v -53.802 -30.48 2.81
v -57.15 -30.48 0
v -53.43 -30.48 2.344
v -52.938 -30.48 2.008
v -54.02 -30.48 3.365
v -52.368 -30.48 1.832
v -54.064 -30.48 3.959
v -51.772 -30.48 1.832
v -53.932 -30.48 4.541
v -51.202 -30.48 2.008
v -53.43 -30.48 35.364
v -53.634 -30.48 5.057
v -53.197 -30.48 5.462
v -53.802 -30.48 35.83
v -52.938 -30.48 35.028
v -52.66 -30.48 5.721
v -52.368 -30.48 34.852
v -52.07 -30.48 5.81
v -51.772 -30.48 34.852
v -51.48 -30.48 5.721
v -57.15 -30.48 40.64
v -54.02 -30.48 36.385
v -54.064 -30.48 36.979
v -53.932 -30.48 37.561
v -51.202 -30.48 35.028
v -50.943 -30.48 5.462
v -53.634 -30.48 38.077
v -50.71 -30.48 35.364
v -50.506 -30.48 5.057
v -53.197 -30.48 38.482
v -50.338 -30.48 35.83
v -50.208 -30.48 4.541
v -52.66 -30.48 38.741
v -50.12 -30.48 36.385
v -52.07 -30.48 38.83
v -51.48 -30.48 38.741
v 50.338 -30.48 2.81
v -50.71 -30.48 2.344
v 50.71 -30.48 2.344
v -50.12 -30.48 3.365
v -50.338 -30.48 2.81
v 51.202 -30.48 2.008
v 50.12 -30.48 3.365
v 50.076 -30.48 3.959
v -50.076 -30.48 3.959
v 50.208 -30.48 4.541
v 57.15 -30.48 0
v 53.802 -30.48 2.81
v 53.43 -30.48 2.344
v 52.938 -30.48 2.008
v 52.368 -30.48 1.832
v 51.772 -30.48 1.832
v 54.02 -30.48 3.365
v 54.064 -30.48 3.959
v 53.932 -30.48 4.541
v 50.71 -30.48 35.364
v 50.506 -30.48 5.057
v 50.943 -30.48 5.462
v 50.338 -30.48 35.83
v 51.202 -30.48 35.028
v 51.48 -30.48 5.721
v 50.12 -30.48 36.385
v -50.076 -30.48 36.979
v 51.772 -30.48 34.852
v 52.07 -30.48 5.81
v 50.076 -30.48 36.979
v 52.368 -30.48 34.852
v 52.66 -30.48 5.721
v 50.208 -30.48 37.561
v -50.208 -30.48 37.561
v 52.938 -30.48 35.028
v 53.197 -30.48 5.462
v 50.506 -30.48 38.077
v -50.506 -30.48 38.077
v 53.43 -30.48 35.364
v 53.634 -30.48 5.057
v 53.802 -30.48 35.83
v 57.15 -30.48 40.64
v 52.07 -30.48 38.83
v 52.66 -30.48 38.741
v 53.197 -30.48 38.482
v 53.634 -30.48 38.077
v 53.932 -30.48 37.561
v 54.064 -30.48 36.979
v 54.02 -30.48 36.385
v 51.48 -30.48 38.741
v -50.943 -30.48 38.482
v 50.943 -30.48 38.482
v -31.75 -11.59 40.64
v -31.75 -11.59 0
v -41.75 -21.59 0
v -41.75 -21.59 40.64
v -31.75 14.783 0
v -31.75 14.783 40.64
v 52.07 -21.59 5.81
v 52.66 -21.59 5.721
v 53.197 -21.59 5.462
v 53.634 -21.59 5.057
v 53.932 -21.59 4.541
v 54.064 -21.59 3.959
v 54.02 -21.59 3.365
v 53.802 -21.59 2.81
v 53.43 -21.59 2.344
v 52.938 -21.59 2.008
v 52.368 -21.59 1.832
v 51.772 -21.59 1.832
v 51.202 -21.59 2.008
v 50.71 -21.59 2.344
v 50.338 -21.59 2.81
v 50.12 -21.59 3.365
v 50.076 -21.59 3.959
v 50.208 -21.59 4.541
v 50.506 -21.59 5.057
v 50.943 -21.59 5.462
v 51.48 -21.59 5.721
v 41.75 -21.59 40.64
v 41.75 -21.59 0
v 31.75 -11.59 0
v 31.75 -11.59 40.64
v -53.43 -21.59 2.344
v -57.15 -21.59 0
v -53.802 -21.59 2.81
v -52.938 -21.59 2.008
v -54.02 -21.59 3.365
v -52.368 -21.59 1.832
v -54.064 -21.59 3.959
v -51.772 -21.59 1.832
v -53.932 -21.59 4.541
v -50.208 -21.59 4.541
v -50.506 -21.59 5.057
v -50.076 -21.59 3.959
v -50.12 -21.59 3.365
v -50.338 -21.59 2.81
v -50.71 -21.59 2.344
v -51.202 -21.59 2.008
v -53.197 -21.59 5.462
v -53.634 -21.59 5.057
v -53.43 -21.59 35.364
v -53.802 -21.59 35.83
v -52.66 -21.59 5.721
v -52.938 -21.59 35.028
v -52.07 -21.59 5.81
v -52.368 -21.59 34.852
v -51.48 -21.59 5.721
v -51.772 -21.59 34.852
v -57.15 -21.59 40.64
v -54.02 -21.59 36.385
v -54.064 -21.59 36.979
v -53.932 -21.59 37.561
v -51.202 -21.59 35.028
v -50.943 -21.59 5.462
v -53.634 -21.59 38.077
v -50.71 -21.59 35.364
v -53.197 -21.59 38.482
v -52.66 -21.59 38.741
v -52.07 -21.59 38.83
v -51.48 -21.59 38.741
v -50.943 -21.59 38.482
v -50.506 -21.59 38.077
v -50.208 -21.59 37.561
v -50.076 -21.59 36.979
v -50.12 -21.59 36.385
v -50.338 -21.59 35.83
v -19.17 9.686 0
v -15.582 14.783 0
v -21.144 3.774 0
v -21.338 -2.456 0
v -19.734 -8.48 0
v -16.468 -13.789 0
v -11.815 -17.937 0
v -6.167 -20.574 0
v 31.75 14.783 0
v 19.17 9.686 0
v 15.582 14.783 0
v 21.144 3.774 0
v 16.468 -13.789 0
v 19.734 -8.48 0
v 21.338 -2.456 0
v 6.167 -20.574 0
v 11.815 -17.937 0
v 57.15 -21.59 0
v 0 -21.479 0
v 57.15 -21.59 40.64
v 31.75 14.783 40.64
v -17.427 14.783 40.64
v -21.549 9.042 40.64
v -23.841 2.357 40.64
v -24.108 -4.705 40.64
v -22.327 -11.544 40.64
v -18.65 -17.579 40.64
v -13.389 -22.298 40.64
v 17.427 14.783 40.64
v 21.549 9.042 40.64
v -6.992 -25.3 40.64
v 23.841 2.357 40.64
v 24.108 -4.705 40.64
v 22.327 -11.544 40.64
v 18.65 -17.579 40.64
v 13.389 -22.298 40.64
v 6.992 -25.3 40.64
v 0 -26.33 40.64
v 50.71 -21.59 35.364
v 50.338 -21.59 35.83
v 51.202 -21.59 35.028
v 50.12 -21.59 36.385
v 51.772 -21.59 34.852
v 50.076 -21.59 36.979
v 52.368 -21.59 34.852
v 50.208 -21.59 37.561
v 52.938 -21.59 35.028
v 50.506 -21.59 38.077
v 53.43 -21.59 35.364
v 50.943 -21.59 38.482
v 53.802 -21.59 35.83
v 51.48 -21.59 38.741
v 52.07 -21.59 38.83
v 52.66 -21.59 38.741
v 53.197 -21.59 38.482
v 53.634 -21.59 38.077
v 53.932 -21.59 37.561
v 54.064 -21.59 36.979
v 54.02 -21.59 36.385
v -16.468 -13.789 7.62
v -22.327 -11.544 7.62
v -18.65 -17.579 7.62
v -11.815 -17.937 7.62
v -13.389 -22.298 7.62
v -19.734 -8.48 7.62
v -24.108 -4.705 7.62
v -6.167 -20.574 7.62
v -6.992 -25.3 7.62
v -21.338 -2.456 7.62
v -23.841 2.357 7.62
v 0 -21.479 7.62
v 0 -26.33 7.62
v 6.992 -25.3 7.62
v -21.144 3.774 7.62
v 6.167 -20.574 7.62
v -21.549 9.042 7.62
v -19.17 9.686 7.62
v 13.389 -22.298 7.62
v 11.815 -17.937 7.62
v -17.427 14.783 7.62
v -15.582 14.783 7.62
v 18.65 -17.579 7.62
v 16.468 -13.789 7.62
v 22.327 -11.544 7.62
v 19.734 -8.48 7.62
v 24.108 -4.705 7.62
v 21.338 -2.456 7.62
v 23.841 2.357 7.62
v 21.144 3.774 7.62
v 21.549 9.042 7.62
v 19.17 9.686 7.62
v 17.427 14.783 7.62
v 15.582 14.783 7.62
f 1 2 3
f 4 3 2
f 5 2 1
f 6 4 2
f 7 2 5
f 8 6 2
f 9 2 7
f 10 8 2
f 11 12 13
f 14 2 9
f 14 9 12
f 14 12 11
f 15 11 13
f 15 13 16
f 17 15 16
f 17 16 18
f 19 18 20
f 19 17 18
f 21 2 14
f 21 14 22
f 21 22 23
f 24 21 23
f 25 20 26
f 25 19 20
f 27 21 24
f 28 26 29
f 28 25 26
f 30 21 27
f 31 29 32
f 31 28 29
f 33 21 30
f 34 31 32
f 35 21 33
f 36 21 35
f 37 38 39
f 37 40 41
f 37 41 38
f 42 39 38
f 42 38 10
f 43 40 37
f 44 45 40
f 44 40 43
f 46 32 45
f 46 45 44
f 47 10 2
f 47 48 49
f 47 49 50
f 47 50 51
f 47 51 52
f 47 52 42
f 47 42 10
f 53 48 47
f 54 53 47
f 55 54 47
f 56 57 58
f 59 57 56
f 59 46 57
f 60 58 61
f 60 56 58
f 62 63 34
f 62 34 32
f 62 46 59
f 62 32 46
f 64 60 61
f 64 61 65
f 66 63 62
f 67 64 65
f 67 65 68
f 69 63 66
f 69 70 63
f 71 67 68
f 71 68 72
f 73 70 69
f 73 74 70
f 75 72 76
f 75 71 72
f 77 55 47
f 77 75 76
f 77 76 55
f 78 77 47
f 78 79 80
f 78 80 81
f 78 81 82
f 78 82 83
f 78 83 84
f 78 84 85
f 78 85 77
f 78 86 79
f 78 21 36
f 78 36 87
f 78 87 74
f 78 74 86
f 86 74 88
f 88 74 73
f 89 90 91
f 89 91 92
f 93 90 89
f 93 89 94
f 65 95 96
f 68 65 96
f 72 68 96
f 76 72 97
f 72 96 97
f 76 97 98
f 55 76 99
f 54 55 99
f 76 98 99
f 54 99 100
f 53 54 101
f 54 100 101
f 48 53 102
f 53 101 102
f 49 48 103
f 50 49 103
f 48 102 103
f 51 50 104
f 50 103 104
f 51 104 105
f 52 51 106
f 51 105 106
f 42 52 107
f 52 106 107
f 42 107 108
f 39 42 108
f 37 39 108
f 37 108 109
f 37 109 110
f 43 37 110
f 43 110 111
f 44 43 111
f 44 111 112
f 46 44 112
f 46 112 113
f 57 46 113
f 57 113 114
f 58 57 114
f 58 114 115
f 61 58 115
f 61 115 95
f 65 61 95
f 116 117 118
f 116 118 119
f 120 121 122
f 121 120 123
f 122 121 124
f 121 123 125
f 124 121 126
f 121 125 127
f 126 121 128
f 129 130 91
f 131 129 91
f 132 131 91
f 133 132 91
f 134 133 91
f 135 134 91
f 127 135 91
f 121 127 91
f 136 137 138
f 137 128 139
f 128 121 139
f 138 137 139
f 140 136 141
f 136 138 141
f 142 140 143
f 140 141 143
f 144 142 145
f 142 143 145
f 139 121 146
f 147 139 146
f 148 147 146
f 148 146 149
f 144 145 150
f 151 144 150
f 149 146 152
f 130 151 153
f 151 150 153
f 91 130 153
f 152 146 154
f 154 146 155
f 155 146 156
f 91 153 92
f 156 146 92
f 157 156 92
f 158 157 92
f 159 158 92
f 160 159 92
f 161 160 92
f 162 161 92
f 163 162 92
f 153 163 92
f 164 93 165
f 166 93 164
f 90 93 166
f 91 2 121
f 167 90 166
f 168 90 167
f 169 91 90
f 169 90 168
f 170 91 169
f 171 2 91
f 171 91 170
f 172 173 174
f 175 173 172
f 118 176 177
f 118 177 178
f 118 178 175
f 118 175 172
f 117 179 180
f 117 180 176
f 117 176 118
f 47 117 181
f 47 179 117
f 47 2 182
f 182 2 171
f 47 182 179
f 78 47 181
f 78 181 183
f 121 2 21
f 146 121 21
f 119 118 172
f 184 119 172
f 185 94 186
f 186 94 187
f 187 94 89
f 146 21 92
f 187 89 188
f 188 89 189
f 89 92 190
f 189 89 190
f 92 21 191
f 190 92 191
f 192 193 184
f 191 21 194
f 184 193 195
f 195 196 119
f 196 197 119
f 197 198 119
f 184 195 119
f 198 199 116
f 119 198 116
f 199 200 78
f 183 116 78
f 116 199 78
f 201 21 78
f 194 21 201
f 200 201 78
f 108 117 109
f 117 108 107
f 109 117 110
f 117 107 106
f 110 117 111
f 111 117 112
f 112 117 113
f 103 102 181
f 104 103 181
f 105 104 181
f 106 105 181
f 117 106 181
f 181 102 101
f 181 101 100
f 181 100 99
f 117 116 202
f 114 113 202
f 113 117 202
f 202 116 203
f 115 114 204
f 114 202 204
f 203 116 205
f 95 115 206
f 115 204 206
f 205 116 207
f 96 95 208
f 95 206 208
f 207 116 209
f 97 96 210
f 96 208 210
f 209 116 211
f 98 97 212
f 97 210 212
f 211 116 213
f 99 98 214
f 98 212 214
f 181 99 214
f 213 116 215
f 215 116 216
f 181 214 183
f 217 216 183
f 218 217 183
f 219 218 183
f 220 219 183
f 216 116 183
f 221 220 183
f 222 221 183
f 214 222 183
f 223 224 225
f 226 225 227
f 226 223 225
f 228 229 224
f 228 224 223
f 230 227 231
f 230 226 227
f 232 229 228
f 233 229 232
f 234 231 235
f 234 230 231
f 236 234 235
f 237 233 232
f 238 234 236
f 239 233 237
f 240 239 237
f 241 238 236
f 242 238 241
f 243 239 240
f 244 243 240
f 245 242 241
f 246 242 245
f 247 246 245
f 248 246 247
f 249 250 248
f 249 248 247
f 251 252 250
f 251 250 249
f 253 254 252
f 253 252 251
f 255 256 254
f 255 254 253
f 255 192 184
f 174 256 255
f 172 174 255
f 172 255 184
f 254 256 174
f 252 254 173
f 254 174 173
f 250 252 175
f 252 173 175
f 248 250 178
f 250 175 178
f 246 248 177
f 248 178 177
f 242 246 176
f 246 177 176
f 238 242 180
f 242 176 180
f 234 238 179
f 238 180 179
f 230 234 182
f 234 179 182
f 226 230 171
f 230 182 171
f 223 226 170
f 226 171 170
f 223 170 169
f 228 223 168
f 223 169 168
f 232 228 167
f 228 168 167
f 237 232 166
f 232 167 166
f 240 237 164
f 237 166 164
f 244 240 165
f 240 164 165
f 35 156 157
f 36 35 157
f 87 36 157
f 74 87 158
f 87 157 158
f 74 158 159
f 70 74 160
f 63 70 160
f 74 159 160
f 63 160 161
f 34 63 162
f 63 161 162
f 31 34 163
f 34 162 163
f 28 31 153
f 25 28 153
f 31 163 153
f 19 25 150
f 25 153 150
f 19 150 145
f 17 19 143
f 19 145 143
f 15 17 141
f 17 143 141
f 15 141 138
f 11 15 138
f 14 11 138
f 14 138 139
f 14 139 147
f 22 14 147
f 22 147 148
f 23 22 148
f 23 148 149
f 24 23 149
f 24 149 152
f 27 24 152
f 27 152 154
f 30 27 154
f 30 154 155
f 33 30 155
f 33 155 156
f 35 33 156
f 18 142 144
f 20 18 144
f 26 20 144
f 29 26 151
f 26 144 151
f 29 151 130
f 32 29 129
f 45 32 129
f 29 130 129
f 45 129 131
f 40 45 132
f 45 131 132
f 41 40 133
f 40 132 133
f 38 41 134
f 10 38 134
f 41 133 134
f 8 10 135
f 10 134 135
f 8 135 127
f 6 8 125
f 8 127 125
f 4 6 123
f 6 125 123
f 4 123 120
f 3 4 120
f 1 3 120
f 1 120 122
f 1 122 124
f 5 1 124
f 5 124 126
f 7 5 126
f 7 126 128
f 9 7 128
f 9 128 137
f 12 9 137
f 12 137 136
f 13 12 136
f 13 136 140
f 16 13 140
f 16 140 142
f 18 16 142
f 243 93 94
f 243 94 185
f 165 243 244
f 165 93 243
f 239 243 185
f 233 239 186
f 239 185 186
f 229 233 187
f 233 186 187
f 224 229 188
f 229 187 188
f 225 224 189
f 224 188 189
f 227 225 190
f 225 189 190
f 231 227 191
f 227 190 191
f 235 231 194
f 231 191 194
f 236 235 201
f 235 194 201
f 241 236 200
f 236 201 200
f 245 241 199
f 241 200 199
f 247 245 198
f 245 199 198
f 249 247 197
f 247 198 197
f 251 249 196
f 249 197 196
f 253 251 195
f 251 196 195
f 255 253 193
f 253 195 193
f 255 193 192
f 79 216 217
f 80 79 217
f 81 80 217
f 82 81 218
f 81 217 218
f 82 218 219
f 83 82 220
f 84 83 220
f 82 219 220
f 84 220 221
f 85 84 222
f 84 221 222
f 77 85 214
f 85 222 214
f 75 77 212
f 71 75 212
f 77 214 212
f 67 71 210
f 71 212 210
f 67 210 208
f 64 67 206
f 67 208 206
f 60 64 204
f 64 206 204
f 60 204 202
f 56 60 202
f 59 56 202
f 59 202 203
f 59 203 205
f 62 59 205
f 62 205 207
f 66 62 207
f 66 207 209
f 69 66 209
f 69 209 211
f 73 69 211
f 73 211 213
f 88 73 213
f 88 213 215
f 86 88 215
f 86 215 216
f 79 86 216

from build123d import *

# Parameters (mm, degrees)
SKETCH1_W           = 63.5
SKETCH1_H           = 60.96
BOSS_EXTRUDE1_DEPTH = 40.64
SKETCH2_R           = 24.25
CUT_EXTRUDE1_DEPTH  = 33.02
SKETCH8_W           = 63.5
SKETCH8_H           = 40.64
CUT_EXTRUDE3_DEPTH  = 15.6972
SKETCH16_W          = 25.4
SKETCH16_H          = 40.64
BOSS_EXTRUDE5_DEPTH = 8.89
SKETCH17_R          = 2
CUT_EXTRUDE5_DEPTH  = 79.998181497
SKETCH11_R          = 21.478557246
CUT_EXTRUDE6_DEPTH  = 77.464125575
CHAMFER1_SIZE       = 10


with BuildPart() as part:
    # Sketch1 → Boss-Extrude1 (new body)
    with BuildSketch(Plane.XY):
        Rectangle(SKETCH1_W, SKETCH1_H)
    extrude(amount=BOSS_EXTRUDE1_DEPTH)

    # Sketch2 → Cut-Extrude1 (cut)
    with BuildSketch(Plane.XY.offset(40.64)):
        with Locations((0, -2.08)):
            Circle(SKETCH2_R)
    extrude(amount=-CUT_EXTRUDE1_DEPTH, mode=Mode.SUBTRACT)

    # Sketch8 → Cut-Extrude3 (cut)
    with BuildSketch(Plane(origin=(0, 30.48, 0), x_dir=(1, 0, 0), z_dir=(0, 1, 0))):
        with Locations((0, -20.32)):
            Rectangle(SKETCH8_W, SKETCH8_H)
    extrude(amount=-CUT_EXTRUDE3_DEPTH, mode=Mode.SUBTRACT)

    # Sketch16 → Boss-Extrude5 (add)
    with BuildSketch(Plane.XZ.offset(30.48)):
        with Locations((-44.45, 20.32)):
            Rectangle(SKETCH16_W, SKETCH16_H)
        with Locations((44.45, 20.32)):
            Rectangle(SKETCH16_W, SKETCH16_H)
    extrude(amount=-BOSS_EXTRUDE5_DEPTH)

    # Sketch17 → Cut-Extrude5 (cut, through all)
    with BuildSketch(Plane(origin=(0, -21.59, 0), x_dir=(1, 0, 0), z_dir=(0, 1, 0))):
        with Locations(Location((-52.07, -3.81, 0), (0, 0, 270))):
            Circle(SKETCH17_R)
        with Locations(Location((-52.07, -36.83, 0), (0, 0, 270))):
            Circle(SKETCH17_R)
        with Locations(Location((52.07, -3.81, 0), (0, 0, 270))):
            Circle(SKETCH17_R)
        with Locations(Location((52.07, -36.83, 0), (0, 0, 270))):
            Circle(SKETCH17_R)
    extrude(amount=-CUT_EXTRUDE5_DEPTH, mode=Mode.SUBTRACT)

    # Sketch11 → Cut-Extrude6 (cut, through all)
    with BuildSketch(Plane(origin=(0, 0, 0), x_dir=(-1, 0, 0), z_dir=(0, 0, -1))):
        Circle(SKETCH11_R)
    extrude(amount=-CUT_EXTRUDE6_DEPTH, mode=Mode.SUBTRACT)

    # Chamfer1
    chamfer1_edges = [part.edges().sort_by_distance(p)[0] for p in [
        (-31.75, -21.59, 20.32),
        (31.75, -21.59, 20.32),
    ]]
    chamfer(chamfer1_edges, length=CHAMFER1_SIZE)


solid = part.part
